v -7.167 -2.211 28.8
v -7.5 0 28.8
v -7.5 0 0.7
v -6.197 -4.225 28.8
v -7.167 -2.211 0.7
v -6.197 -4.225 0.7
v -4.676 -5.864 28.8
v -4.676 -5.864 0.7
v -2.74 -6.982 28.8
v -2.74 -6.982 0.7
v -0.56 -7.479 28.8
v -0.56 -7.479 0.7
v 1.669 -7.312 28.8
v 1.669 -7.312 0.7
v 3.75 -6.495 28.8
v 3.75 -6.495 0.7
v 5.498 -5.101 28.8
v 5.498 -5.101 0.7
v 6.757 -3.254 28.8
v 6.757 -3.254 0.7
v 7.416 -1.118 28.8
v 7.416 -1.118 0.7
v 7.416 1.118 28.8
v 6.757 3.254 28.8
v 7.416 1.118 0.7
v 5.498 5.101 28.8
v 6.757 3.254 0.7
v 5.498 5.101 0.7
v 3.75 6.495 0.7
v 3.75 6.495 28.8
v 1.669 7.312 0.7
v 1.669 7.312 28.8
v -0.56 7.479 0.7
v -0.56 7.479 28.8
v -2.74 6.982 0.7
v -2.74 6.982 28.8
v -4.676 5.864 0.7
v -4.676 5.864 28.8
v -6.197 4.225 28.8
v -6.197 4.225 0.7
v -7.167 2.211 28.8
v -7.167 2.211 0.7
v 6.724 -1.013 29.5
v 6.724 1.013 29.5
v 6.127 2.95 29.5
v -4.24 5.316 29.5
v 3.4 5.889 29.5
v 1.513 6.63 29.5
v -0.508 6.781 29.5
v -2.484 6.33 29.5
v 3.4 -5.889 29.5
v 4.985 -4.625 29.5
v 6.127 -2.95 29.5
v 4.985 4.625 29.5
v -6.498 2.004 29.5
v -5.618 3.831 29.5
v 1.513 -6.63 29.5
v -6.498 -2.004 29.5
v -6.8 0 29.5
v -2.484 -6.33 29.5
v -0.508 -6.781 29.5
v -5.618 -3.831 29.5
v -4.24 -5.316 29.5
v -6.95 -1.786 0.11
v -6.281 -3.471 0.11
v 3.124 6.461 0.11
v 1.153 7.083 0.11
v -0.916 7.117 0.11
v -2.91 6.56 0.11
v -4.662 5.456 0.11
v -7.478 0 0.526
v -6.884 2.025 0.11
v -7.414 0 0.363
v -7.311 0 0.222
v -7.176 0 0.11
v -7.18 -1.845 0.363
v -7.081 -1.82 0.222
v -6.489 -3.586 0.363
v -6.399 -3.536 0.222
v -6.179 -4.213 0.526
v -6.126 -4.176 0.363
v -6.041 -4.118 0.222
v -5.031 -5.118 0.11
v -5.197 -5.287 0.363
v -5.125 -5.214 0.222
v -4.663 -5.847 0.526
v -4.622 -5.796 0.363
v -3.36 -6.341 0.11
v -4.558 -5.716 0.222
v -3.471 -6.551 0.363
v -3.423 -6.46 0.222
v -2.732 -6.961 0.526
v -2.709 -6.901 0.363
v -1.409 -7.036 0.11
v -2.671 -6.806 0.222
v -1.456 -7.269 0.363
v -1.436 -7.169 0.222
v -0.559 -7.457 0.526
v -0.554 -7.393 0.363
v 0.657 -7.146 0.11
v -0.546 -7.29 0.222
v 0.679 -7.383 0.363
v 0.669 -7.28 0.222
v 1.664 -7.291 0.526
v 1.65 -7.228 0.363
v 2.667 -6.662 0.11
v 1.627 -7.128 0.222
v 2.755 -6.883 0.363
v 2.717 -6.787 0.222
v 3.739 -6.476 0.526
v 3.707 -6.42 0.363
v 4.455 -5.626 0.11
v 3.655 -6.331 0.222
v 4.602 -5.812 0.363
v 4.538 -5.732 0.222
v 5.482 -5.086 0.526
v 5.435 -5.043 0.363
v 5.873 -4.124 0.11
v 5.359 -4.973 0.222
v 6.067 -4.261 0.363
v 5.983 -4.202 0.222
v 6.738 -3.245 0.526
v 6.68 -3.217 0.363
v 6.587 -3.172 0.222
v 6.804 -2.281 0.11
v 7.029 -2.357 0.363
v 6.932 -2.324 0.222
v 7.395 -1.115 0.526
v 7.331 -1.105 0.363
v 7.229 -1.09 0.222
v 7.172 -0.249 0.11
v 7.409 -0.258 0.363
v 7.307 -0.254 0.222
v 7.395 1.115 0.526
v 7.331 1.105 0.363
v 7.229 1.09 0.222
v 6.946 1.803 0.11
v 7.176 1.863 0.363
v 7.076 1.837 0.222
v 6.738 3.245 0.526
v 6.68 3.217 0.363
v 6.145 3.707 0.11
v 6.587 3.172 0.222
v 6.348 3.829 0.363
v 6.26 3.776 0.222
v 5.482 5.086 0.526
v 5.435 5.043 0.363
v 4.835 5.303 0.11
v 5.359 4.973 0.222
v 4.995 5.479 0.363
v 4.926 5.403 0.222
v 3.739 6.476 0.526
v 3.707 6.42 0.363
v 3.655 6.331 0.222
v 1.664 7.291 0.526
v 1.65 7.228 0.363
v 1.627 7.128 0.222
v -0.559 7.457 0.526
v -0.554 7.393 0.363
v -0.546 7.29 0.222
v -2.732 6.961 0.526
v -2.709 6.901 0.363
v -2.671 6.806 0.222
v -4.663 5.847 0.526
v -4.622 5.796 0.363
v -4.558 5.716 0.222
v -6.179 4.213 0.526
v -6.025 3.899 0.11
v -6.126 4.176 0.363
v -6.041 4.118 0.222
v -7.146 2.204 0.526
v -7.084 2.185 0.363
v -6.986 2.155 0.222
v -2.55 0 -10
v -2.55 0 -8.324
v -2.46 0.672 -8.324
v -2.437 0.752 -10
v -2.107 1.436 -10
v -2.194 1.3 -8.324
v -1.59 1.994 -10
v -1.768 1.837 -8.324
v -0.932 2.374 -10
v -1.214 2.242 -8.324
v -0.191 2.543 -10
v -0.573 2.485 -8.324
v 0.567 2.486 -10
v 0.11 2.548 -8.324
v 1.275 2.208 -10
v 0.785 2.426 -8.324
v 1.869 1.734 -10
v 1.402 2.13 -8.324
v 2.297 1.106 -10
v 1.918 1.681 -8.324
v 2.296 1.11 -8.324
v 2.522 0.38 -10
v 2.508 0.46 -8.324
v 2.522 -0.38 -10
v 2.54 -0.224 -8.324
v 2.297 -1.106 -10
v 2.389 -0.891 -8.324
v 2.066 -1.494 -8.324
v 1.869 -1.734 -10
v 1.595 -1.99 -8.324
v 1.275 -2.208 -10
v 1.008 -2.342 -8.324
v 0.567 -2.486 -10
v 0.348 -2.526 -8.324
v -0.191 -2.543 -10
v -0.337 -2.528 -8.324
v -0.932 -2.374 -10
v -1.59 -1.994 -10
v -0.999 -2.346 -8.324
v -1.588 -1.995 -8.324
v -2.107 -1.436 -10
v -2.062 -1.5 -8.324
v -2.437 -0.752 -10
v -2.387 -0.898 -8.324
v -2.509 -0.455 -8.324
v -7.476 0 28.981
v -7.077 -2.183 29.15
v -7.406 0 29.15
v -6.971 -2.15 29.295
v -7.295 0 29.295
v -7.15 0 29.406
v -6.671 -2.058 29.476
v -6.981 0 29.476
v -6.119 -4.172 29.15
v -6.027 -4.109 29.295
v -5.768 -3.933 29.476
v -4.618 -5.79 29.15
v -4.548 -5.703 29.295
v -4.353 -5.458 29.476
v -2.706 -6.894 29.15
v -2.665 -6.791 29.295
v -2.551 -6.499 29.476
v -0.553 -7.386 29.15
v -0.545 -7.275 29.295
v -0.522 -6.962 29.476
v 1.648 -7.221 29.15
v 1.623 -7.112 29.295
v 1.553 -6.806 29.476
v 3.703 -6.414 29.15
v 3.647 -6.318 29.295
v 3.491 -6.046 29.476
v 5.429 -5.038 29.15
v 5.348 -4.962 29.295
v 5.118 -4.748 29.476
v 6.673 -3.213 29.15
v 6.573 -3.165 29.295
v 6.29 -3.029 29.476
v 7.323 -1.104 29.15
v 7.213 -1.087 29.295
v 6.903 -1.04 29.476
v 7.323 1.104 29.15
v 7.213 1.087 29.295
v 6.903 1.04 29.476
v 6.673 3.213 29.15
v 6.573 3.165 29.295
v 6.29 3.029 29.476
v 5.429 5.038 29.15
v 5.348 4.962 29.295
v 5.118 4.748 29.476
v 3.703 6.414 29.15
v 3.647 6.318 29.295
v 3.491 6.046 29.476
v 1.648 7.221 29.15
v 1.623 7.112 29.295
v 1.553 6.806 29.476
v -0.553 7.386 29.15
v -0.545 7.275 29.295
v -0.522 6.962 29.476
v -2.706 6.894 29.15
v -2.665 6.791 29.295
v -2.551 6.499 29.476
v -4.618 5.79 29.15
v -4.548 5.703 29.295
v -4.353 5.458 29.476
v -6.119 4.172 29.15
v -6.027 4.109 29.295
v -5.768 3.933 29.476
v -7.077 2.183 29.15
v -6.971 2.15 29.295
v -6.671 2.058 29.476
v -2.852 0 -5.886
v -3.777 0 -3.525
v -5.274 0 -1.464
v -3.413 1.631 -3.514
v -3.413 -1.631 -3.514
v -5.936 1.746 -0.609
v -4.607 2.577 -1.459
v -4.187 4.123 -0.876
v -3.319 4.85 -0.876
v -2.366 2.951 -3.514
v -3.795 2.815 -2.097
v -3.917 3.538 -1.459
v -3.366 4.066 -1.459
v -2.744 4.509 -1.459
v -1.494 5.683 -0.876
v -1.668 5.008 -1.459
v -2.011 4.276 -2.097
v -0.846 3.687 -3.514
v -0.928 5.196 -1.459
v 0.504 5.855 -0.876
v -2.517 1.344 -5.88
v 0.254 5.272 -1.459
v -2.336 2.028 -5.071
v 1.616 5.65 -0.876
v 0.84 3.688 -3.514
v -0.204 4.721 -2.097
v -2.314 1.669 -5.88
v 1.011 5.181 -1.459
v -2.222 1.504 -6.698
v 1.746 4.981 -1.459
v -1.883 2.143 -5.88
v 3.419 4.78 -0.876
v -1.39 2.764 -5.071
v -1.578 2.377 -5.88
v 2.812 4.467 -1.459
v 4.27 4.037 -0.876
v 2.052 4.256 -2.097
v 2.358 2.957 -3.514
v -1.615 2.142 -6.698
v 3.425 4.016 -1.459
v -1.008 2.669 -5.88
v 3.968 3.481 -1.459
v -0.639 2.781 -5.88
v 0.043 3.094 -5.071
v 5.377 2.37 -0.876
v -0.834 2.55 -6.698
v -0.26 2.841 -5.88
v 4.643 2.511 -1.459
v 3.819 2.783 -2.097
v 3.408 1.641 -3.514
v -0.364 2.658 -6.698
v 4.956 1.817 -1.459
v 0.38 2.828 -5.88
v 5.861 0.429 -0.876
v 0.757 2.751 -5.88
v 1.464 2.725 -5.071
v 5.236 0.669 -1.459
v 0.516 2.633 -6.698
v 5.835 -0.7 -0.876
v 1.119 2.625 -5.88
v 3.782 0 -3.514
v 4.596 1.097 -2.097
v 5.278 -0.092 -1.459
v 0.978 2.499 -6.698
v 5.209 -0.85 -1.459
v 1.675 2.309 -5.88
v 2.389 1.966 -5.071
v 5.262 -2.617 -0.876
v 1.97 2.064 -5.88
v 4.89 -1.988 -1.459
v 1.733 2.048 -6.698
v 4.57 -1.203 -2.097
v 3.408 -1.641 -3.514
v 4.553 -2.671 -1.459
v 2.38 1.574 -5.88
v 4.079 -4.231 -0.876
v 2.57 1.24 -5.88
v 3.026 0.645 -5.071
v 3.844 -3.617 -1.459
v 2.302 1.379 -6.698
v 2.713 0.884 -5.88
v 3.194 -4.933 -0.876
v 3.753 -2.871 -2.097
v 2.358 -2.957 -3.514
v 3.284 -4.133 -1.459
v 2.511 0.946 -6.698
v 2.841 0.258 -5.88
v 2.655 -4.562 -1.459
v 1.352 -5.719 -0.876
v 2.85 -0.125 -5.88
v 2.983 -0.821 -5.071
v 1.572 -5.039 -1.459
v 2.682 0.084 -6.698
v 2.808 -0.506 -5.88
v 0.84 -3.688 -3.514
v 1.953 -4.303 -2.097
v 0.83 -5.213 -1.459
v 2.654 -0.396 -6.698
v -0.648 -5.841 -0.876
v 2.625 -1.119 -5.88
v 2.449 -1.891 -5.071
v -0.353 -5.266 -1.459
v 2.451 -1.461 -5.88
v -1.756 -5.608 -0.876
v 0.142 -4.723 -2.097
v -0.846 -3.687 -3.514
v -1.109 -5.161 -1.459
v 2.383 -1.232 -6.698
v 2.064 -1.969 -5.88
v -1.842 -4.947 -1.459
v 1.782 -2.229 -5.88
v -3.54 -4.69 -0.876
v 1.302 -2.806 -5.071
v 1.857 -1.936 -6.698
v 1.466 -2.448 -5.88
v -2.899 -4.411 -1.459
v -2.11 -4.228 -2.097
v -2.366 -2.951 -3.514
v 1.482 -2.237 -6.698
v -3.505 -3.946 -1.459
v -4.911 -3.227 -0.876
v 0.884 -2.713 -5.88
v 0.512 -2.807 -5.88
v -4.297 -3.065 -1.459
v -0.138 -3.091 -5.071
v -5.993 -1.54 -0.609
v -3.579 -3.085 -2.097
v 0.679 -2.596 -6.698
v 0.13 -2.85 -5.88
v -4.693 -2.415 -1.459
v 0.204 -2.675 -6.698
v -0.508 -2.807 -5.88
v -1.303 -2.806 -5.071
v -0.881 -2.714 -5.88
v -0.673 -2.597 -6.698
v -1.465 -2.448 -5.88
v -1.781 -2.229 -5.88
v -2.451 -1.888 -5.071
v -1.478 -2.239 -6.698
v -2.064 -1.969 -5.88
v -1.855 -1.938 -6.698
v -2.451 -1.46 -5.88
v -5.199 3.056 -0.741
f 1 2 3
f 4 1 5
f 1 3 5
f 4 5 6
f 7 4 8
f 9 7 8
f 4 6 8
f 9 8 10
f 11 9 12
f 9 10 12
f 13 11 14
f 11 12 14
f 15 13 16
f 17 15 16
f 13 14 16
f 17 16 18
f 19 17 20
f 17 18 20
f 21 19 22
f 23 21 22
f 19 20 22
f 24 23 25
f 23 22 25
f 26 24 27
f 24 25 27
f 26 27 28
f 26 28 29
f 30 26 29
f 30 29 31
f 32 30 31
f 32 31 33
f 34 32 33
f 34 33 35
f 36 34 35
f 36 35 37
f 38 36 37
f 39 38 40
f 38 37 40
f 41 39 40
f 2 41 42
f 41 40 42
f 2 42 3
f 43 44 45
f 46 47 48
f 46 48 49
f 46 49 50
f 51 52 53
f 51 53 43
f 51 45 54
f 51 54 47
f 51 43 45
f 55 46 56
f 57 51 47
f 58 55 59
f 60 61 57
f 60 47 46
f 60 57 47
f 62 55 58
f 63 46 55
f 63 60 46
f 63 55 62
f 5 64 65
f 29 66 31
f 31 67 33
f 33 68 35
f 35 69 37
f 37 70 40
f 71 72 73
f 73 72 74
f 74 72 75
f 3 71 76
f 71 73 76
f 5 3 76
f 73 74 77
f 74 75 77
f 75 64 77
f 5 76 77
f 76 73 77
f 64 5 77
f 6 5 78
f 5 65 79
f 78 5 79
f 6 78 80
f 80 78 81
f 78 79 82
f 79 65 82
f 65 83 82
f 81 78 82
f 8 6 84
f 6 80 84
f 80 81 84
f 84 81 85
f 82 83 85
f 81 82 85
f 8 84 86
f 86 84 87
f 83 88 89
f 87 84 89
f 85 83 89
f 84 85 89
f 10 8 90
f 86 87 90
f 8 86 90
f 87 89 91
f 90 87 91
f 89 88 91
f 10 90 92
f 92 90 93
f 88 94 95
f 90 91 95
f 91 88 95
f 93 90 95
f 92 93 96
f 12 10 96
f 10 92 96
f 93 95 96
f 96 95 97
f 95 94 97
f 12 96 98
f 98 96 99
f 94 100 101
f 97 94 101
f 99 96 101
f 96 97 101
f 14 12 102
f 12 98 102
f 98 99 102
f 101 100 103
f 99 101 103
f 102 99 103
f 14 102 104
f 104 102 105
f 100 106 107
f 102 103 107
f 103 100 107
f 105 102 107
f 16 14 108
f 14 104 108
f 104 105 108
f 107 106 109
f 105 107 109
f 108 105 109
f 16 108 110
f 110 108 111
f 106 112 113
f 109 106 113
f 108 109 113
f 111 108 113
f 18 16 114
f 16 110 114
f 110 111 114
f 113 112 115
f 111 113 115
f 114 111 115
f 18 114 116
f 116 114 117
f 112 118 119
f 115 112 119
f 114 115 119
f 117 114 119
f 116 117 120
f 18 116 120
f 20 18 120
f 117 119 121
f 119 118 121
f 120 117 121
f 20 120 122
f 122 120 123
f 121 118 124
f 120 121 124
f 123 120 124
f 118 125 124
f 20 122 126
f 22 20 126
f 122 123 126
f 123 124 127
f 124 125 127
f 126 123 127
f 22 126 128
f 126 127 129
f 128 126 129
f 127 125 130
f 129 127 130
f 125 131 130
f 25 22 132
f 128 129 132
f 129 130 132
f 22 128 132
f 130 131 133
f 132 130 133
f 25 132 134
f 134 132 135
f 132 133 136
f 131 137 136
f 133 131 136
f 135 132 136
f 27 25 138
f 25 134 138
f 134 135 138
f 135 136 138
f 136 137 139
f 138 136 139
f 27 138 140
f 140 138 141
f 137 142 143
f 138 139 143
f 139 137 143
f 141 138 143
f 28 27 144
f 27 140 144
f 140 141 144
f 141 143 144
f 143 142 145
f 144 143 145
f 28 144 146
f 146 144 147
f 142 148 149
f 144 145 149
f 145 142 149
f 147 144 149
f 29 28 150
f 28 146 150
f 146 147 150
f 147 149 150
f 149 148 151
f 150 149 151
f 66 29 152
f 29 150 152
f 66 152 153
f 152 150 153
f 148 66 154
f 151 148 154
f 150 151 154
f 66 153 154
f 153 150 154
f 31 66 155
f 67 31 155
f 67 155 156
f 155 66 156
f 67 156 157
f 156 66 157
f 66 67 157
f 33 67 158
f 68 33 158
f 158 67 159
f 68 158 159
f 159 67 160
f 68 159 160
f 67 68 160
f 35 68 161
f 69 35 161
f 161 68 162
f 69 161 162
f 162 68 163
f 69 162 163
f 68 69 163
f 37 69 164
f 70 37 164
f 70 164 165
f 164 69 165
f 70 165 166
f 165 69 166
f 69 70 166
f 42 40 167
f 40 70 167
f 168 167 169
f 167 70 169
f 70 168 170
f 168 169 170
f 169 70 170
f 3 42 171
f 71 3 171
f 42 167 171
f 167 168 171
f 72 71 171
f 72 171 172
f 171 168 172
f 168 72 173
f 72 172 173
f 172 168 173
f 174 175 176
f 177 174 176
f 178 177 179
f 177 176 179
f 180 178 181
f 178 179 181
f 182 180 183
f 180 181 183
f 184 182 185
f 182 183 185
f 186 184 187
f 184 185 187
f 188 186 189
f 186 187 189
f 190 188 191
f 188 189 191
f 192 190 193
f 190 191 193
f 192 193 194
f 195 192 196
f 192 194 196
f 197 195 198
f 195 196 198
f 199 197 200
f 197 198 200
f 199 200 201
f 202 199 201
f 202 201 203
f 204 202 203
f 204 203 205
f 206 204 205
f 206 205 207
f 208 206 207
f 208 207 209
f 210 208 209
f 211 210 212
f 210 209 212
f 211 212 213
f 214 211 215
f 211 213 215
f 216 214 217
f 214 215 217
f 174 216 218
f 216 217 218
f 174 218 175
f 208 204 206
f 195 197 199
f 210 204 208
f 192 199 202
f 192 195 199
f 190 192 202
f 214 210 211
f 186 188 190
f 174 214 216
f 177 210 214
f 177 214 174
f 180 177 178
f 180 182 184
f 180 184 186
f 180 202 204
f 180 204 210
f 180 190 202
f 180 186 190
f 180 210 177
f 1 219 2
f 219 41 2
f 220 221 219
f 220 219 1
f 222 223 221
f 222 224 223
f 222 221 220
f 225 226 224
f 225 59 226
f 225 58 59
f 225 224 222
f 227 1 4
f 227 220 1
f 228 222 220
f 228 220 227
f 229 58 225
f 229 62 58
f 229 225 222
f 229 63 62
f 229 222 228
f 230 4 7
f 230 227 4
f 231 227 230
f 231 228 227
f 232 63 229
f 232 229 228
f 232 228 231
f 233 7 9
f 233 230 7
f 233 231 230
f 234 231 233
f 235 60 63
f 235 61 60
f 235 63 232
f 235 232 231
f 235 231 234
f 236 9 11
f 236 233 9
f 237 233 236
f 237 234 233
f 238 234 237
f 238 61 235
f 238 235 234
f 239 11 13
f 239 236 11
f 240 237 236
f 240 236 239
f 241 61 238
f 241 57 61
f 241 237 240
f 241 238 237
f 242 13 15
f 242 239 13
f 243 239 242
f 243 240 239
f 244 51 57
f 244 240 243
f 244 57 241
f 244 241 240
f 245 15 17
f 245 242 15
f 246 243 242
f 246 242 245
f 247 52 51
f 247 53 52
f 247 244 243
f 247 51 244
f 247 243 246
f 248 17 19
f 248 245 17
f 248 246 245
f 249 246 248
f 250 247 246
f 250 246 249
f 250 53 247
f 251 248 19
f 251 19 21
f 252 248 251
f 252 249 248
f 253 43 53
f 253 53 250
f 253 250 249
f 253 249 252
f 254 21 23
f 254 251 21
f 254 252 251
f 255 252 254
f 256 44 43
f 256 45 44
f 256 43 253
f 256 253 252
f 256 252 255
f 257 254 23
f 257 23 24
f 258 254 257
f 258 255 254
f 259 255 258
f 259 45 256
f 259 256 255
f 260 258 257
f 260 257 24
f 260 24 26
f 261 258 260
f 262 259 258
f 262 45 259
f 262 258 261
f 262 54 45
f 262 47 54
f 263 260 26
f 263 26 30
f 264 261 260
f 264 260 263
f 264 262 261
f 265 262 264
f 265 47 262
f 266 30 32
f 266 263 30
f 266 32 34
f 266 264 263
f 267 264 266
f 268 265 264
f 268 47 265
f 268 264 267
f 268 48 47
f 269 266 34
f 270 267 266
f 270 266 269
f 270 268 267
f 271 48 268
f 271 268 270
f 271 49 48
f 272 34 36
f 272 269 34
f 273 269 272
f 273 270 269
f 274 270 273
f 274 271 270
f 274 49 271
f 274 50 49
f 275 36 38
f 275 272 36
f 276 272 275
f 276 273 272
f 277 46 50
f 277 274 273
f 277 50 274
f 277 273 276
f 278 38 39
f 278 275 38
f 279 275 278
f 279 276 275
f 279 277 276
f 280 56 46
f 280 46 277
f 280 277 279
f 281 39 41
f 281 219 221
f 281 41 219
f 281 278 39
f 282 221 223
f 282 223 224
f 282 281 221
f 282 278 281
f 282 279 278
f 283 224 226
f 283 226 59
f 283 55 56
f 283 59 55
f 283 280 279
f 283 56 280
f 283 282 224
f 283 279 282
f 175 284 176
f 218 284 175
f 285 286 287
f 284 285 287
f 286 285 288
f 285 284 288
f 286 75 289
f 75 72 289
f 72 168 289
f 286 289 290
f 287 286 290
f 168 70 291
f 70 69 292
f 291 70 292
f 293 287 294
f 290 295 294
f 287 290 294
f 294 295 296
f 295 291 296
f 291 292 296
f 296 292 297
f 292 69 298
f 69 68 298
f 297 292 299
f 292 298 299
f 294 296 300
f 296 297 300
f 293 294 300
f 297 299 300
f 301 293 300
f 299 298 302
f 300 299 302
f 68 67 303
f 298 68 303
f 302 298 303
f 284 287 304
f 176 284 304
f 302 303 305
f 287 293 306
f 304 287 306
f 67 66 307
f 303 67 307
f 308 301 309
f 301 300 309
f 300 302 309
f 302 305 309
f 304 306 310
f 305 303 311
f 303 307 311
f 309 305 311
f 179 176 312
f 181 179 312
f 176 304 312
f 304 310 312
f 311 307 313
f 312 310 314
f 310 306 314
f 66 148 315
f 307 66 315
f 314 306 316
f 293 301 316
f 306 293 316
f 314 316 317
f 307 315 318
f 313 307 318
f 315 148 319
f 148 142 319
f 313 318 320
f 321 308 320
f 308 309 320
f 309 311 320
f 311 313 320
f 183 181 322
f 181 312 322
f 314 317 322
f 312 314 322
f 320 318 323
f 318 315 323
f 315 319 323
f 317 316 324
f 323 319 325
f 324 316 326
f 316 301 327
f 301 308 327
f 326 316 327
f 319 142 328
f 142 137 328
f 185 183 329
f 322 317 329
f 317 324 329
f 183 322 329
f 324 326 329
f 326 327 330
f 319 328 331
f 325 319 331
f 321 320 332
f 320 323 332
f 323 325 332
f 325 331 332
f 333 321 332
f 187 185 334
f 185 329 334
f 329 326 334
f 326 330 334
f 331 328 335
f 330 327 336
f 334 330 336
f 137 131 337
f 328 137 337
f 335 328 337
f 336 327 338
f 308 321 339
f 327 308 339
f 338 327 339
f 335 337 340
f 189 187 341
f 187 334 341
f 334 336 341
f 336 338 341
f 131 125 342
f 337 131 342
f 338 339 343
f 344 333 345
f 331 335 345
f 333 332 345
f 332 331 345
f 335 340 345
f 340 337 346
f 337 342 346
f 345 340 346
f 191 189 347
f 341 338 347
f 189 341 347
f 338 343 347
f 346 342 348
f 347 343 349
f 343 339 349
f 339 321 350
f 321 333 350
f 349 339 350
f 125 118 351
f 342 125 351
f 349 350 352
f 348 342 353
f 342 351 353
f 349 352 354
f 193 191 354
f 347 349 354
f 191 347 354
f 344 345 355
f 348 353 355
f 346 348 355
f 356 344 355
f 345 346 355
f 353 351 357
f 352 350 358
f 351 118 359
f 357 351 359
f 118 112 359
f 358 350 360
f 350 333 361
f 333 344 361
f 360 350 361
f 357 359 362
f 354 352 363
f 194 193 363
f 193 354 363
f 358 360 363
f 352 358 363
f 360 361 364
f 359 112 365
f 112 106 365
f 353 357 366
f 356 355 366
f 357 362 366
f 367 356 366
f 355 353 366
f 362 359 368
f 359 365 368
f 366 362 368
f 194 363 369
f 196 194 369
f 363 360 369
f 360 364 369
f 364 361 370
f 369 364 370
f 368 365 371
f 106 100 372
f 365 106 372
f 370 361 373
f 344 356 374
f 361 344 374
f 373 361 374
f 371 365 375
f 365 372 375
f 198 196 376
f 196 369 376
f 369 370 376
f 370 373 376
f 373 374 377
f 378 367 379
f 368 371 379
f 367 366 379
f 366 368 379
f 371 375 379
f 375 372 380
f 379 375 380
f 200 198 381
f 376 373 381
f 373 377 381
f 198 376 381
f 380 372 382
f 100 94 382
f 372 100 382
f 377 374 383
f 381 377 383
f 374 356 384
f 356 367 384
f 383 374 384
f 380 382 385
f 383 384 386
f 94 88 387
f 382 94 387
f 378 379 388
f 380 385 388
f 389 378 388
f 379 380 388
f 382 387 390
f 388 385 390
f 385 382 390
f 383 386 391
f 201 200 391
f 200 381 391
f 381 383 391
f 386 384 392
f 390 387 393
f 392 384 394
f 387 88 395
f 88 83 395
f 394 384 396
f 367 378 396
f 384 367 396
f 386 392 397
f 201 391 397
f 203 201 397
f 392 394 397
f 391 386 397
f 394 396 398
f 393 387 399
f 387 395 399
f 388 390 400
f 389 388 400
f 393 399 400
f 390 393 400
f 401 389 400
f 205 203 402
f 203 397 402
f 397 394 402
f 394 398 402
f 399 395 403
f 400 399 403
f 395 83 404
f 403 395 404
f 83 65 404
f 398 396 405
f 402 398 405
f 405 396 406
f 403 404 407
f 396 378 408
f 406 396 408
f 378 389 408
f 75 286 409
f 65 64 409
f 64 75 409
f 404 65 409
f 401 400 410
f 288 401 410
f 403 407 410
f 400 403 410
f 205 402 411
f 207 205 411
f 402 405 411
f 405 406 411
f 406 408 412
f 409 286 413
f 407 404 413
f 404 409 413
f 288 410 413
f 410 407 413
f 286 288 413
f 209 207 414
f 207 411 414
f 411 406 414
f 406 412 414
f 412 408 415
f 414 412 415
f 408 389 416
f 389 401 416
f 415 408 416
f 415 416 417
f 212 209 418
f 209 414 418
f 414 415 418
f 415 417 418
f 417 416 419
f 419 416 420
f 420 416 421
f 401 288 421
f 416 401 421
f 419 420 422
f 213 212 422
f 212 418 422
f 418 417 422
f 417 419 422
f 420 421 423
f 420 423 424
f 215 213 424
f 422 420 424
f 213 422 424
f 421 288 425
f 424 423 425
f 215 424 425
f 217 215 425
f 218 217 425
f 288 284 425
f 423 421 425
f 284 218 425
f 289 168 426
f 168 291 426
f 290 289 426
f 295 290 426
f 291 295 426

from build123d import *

# Parameters (mm, degrees)
SKETCH1_R           = 7.5
BOSS_EXTRUDE1_DEPTH = 29.5
SKETCH2_R           = 2.55
BOSS_EXTRUDE2_DEPTH = 10
FILLET1_R           = 0.7
FILLET2_R           = 10


with BuildPart() as part:
    # Sketch1 → Boss-Extrude1 (new body)
    with BuildSketch(Plane.XY):
        with Locations(Location((0, 0, 0), (0, 0, 180))):
            Circle(SKETCH1_R)
    extrude(amount=BOSS_EXTRUDE1_DEPTH)

    # Sketch2 → Boss-Extrude2 (add)
    with BuildSketch(Plane(origin=(0, 0, 0), x_dir=(-1, 0, 0), z_dir=(0, 0, -1))):
        Circle(SKETCH2_R)
    extrude(amount=BOSS_EXTRUDE2_DEPTH)

    # Fillet1
    fillet1_edges = [part.edges().sort_by_distance(p)[0] for p in [
        (7.5, 0, 0),
        (7.5, 0, 29.5),
    ]]
    fillet(fillet1_edges, radius=FILLET1_R)

    # Fillet2
    fillet2_edges = [part.edges().sort_by_distance(p)[0] for p in [
        (2.55, 0, 0),
    ]]
    fillet(fillet2_edges, radius=FILLET2_R - 0.0001)  # a hair under: the kernel refuses the full size


solid = part.part
